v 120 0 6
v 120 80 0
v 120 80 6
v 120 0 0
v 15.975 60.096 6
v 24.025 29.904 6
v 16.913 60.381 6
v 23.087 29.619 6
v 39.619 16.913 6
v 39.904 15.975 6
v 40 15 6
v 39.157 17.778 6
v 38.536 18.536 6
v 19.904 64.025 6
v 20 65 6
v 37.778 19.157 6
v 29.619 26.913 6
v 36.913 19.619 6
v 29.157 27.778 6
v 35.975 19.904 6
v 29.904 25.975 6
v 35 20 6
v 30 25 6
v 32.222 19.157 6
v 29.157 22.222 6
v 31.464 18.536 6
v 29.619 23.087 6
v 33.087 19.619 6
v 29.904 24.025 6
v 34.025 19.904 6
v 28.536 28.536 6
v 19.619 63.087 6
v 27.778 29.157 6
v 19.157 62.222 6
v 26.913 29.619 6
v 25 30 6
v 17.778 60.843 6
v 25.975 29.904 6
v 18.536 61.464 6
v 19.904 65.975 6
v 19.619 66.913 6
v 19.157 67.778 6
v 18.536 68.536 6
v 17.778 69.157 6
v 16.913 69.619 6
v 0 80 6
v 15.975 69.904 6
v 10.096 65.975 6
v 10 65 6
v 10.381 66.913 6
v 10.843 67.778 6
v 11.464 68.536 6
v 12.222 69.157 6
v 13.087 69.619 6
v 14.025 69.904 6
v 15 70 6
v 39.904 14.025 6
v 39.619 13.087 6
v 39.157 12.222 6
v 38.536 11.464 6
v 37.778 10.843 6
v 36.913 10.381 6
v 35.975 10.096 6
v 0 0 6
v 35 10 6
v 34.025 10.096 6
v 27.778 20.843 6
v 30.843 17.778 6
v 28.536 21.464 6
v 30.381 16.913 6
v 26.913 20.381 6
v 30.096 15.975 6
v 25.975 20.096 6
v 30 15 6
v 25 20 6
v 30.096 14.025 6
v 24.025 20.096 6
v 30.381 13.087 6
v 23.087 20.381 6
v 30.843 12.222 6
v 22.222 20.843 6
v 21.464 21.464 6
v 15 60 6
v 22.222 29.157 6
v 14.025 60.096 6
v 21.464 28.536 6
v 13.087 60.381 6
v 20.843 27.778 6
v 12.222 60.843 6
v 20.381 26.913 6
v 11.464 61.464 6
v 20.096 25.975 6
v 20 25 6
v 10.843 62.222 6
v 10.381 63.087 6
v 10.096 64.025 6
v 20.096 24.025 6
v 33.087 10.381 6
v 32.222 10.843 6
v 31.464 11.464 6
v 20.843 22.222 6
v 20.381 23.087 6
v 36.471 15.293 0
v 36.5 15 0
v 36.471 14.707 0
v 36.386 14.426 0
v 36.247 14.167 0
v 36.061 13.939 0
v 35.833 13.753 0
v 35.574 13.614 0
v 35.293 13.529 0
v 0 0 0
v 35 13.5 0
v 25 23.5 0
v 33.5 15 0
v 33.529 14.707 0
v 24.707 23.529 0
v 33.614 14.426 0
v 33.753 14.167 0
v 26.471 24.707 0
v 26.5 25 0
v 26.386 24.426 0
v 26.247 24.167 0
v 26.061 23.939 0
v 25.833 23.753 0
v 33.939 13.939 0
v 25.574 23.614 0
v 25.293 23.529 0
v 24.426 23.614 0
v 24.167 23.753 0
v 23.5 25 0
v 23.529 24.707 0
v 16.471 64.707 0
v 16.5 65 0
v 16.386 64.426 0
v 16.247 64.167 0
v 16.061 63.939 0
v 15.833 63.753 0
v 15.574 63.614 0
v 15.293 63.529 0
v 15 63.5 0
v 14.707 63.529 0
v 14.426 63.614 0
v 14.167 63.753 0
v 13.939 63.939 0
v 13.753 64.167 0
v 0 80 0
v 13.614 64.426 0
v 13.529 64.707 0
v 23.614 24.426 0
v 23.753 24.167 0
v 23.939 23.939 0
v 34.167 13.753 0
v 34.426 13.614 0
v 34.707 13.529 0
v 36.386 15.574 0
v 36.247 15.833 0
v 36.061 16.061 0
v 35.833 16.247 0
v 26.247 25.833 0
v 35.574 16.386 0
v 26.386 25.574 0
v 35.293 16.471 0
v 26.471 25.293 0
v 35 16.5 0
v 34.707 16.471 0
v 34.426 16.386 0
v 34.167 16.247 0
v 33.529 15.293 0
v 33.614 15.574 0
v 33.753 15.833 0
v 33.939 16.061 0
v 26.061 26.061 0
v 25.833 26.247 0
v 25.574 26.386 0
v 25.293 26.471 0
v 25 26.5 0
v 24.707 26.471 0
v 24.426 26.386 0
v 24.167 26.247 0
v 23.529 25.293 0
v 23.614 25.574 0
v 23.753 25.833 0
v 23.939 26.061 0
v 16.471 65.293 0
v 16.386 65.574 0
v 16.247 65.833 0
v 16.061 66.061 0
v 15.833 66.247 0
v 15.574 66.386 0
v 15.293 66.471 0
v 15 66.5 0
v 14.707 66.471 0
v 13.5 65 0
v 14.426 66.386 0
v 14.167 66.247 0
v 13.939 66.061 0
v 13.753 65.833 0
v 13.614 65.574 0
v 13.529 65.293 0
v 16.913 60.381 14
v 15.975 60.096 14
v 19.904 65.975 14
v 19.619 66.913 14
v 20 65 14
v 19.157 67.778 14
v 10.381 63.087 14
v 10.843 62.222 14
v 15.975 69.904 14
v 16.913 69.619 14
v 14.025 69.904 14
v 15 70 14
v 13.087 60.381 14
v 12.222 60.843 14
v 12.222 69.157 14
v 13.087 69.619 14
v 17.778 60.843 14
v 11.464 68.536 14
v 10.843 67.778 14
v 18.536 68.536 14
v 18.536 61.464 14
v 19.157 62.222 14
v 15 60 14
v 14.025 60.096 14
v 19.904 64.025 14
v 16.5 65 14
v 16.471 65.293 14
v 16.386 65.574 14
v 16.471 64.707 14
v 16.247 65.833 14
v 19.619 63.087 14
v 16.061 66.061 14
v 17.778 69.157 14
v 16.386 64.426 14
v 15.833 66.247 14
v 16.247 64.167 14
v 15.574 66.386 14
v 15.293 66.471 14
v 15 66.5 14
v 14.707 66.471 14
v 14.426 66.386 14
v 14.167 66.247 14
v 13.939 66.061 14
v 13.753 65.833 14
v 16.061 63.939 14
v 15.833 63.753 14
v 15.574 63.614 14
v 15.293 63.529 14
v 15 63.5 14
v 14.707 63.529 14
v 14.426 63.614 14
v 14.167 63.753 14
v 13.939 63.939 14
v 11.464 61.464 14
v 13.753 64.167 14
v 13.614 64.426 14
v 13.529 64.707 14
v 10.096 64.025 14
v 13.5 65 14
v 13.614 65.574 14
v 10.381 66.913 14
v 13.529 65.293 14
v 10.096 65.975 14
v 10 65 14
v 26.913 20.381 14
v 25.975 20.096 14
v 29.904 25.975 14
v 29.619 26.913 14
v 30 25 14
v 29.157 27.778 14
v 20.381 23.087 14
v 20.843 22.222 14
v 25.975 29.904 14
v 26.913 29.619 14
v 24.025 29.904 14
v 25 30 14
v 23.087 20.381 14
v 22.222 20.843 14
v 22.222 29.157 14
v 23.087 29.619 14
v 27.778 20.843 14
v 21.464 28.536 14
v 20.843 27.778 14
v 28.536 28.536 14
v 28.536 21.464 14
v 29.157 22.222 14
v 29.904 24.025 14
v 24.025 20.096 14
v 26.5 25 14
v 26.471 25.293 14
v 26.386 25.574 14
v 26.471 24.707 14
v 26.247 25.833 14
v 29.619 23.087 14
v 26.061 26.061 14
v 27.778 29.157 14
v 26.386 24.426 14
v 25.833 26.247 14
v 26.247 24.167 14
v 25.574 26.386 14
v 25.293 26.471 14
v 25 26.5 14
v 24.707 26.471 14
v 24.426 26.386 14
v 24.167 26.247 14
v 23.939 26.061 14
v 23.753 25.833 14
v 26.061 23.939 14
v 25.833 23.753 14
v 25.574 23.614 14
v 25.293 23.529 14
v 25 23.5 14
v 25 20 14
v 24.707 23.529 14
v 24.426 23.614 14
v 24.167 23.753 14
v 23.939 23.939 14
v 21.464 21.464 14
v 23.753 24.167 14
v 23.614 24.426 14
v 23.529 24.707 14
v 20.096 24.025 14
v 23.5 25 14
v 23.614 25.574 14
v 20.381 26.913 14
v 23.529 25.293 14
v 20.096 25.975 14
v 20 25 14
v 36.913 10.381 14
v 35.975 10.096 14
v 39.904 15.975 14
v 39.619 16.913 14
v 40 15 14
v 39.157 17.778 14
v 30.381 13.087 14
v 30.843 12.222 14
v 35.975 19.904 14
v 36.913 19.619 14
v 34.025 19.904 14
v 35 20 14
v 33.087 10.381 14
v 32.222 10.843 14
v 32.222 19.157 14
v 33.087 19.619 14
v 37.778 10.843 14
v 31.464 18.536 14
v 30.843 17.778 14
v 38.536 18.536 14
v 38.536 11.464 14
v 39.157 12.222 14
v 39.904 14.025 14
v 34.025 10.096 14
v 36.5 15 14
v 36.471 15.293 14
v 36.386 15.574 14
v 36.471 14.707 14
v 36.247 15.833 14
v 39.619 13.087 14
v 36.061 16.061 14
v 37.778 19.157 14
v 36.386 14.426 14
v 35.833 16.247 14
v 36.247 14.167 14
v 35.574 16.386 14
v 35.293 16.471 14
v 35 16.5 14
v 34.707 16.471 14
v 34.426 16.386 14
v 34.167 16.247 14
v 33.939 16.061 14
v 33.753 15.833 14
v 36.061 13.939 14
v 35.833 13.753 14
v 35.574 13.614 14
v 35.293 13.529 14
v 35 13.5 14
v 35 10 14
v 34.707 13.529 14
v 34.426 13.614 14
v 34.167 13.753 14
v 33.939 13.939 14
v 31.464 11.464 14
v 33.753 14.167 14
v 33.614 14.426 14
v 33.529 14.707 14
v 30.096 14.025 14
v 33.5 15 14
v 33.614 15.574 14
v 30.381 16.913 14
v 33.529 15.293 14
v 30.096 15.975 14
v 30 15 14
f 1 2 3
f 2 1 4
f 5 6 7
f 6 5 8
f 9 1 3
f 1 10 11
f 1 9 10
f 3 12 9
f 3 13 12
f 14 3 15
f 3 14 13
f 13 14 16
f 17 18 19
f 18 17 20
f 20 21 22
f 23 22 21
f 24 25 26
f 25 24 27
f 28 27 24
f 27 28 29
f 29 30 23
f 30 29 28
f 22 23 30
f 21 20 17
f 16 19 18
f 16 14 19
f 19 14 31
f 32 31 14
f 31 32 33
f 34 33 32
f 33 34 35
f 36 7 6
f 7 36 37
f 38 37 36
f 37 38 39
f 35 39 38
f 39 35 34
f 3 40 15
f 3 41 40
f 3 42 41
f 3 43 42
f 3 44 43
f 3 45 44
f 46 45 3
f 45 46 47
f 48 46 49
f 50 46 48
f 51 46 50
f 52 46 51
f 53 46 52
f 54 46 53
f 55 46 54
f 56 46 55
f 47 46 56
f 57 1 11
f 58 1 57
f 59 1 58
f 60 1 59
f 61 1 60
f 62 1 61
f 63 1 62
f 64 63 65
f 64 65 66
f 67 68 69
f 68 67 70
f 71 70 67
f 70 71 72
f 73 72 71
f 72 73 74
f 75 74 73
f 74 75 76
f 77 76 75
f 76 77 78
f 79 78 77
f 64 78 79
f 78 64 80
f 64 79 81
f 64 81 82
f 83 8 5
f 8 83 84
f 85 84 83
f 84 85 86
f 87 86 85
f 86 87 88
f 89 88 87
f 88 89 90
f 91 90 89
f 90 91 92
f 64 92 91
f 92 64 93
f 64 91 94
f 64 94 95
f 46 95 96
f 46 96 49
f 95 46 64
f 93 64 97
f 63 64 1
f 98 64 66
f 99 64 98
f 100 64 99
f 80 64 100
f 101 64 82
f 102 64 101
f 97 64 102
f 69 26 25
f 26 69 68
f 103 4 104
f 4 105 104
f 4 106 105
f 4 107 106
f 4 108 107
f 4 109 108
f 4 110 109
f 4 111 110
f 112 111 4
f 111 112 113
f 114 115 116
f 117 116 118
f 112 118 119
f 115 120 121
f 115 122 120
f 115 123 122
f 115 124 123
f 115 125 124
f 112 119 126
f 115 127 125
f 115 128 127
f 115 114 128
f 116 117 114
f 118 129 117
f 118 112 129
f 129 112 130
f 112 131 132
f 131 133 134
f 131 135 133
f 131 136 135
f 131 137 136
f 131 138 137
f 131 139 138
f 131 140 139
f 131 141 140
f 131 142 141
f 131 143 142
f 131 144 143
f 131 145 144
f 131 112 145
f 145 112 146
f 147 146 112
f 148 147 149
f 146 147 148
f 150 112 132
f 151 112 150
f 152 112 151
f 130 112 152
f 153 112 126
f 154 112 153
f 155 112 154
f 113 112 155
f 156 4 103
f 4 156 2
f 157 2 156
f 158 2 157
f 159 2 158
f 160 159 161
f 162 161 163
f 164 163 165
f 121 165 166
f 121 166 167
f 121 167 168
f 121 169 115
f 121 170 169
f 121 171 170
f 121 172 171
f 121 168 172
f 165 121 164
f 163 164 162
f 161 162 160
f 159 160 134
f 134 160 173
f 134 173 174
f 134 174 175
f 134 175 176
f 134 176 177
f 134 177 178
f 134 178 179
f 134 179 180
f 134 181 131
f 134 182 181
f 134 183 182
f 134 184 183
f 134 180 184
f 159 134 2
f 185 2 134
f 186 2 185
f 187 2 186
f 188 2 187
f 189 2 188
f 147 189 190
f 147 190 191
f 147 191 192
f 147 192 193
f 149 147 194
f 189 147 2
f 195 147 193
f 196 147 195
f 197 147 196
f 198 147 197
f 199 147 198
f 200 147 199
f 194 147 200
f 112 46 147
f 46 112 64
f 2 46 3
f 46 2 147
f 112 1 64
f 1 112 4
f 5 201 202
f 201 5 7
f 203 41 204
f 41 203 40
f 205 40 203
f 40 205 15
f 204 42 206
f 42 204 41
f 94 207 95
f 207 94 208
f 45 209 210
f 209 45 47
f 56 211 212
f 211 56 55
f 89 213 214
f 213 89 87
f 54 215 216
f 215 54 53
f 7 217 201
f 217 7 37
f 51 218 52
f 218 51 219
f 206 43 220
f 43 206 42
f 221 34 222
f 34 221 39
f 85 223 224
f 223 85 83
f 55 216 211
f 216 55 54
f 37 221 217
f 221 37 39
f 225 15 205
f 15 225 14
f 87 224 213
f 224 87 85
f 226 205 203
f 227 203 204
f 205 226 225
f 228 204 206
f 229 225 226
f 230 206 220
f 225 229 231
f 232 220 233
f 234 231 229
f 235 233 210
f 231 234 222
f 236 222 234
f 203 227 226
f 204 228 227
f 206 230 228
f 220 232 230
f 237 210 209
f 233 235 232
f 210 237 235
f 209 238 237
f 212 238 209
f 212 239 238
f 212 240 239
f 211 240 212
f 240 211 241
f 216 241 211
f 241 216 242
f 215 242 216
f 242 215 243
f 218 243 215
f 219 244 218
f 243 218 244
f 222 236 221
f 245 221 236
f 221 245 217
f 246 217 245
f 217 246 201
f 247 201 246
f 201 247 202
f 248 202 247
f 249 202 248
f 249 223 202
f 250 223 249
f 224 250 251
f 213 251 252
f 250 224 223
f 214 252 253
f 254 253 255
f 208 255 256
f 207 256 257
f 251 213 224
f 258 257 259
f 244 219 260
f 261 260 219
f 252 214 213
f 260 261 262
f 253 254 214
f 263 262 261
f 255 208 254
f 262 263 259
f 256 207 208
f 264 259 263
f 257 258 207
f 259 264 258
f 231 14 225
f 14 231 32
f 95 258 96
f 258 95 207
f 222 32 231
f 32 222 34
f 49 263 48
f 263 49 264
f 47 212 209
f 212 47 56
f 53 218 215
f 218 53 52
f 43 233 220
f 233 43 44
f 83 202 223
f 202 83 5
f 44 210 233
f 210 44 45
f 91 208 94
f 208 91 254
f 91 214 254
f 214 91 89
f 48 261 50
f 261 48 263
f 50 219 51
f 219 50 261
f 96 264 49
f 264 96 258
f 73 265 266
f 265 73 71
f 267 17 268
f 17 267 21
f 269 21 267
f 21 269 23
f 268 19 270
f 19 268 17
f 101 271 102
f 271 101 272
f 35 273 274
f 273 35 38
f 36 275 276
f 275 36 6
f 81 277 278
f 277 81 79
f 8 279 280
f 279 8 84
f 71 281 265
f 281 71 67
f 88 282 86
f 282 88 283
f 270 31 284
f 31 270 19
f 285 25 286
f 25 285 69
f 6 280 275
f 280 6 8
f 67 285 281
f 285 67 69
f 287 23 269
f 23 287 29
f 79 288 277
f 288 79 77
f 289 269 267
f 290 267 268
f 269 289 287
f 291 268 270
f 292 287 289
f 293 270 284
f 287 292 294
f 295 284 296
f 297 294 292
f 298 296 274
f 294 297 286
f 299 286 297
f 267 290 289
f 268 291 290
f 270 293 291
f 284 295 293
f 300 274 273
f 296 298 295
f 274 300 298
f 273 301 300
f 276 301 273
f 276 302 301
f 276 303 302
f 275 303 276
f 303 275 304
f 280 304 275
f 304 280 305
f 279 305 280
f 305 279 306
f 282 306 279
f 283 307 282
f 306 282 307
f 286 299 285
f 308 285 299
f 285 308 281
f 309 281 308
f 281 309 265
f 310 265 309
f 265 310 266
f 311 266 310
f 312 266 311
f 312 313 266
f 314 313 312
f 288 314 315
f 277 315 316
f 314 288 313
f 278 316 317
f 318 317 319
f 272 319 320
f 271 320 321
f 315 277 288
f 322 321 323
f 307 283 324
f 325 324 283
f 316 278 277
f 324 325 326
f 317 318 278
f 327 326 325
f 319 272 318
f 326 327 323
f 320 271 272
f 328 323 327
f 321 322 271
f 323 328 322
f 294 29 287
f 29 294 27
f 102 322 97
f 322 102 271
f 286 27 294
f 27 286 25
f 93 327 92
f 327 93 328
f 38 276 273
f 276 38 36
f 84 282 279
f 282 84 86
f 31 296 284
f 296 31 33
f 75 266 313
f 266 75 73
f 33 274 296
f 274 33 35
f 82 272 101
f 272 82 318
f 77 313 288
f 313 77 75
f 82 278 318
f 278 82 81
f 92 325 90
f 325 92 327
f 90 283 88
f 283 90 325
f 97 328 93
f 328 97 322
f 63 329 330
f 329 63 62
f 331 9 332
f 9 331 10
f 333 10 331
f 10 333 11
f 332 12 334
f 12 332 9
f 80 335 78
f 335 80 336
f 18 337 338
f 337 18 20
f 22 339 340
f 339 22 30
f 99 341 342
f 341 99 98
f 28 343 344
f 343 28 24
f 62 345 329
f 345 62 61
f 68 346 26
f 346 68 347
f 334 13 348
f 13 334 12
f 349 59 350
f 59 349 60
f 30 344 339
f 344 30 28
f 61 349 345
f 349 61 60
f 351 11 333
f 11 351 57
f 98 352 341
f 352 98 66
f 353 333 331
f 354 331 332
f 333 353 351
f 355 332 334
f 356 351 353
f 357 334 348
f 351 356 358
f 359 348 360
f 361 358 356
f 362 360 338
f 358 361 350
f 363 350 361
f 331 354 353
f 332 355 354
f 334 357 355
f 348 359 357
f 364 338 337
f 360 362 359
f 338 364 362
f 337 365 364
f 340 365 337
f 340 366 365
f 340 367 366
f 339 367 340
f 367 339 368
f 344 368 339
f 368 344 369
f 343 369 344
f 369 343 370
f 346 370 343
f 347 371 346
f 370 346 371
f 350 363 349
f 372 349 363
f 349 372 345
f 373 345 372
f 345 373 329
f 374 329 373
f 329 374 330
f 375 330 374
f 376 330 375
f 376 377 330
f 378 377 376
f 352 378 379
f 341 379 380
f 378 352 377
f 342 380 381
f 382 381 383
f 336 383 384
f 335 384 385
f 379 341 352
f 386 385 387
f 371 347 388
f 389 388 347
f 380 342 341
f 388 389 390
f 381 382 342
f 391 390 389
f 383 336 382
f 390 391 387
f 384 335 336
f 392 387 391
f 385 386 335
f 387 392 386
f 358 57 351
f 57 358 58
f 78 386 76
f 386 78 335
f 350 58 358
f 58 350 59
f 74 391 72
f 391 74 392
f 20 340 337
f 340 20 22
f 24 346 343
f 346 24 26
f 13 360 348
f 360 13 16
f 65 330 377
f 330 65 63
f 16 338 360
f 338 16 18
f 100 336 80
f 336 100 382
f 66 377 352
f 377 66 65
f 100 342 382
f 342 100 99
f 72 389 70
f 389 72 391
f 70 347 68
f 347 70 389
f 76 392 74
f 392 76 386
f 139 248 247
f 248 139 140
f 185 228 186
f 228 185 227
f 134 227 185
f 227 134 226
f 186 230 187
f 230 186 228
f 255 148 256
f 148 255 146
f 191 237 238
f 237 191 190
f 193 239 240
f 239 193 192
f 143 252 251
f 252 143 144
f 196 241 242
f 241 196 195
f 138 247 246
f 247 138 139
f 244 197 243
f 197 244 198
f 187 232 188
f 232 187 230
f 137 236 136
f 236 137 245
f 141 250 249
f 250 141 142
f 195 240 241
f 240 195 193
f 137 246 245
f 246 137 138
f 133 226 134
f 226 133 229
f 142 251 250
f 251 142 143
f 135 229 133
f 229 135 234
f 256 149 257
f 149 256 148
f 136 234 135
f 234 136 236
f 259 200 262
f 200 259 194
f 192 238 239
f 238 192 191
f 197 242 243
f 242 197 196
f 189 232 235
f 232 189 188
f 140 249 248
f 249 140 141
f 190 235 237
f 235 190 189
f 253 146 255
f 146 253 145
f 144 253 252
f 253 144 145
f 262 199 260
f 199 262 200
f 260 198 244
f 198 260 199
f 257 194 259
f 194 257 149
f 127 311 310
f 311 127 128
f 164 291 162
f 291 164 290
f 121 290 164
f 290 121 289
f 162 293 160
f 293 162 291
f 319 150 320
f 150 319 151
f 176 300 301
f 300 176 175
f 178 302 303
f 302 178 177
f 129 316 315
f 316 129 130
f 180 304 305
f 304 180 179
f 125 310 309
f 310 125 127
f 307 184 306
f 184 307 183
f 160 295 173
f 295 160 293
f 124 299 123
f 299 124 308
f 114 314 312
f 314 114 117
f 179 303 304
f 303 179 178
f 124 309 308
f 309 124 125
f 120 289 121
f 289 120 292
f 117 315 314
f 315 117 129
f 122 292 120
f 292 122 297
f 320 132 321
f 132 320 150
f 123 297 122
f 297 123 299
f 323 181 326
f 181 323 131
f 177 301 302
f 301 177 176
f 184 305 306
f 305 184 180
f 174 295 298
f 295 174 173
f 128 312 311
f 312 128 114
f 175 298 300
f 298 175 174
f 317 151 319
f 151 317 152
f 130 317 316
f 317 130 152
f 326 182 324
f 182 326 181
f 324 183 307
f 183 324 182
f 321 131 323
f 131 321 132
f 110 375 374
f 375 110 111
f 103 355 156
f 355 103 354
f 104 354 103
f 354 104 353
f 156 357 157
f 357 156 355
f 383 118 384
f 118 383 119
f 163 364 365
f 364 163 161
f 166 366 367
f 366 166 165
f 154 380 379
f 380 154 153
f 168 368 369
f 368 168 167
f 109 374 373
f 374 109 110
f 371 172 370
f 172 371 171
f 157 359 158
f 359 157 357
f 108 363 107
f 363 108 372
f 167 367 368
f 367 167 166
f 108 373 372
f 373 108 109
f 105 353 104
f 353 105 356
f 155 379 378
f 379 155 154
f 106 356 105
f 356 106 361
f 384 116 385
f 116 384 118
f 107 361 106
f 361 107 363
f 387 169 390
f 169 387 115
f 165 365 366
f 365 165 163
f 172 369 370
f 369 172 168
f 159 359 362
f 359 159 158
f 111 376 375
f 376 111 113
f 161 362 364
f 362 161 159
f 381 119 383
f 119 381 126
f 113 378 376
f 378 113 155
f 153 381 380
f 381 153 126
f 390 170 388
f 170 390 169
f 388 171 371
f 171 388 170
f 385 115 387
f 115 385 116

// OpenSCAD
$fn = 32;

// ----------------------------------------------------------------------
// Boss field: plate with bosses at given coordinates
// ----------------------------------------------------------------------

// --- parameters (mm) ---
plate_l = 120;            // plate length, X
plate_w = 80;             // plate width, Y
plate_t = 6;              // plate thickness, Z
boss_d = 10;              // boss diameter
boss_h = 8;               // boss height above the plate
bore_d = 3;               // boss bore
fit_tol = 0.02;           // tolerance for press fits, mm
free_tol = 0.2;           // tolerance for clearance fits, mm

total_h = plate_t + boss_h;  // overall height

difference() {
  union() {
    cube([plate_l, plate_w, plate_t]);
    translate([15, 65, plate_t]) cylinder(h = boss_h, d = boss_d);
    translate([25, 25, plate_t]) cylinder(h = boss_h, d = boss_d);
    translate([35, 15, plate_t]) cylinder(h = boss_h, d = boss_d);
  }
  translate([15, 65, -1]) cylinder(h = total_h + 2, d = bore_d);
  translate([25, 25, -1]) cylinder(h = total_h + 2, d = bore_d);
  translate([35, 15, -1]) cylinder(h = total_h + 2, d = bore_d);
}
